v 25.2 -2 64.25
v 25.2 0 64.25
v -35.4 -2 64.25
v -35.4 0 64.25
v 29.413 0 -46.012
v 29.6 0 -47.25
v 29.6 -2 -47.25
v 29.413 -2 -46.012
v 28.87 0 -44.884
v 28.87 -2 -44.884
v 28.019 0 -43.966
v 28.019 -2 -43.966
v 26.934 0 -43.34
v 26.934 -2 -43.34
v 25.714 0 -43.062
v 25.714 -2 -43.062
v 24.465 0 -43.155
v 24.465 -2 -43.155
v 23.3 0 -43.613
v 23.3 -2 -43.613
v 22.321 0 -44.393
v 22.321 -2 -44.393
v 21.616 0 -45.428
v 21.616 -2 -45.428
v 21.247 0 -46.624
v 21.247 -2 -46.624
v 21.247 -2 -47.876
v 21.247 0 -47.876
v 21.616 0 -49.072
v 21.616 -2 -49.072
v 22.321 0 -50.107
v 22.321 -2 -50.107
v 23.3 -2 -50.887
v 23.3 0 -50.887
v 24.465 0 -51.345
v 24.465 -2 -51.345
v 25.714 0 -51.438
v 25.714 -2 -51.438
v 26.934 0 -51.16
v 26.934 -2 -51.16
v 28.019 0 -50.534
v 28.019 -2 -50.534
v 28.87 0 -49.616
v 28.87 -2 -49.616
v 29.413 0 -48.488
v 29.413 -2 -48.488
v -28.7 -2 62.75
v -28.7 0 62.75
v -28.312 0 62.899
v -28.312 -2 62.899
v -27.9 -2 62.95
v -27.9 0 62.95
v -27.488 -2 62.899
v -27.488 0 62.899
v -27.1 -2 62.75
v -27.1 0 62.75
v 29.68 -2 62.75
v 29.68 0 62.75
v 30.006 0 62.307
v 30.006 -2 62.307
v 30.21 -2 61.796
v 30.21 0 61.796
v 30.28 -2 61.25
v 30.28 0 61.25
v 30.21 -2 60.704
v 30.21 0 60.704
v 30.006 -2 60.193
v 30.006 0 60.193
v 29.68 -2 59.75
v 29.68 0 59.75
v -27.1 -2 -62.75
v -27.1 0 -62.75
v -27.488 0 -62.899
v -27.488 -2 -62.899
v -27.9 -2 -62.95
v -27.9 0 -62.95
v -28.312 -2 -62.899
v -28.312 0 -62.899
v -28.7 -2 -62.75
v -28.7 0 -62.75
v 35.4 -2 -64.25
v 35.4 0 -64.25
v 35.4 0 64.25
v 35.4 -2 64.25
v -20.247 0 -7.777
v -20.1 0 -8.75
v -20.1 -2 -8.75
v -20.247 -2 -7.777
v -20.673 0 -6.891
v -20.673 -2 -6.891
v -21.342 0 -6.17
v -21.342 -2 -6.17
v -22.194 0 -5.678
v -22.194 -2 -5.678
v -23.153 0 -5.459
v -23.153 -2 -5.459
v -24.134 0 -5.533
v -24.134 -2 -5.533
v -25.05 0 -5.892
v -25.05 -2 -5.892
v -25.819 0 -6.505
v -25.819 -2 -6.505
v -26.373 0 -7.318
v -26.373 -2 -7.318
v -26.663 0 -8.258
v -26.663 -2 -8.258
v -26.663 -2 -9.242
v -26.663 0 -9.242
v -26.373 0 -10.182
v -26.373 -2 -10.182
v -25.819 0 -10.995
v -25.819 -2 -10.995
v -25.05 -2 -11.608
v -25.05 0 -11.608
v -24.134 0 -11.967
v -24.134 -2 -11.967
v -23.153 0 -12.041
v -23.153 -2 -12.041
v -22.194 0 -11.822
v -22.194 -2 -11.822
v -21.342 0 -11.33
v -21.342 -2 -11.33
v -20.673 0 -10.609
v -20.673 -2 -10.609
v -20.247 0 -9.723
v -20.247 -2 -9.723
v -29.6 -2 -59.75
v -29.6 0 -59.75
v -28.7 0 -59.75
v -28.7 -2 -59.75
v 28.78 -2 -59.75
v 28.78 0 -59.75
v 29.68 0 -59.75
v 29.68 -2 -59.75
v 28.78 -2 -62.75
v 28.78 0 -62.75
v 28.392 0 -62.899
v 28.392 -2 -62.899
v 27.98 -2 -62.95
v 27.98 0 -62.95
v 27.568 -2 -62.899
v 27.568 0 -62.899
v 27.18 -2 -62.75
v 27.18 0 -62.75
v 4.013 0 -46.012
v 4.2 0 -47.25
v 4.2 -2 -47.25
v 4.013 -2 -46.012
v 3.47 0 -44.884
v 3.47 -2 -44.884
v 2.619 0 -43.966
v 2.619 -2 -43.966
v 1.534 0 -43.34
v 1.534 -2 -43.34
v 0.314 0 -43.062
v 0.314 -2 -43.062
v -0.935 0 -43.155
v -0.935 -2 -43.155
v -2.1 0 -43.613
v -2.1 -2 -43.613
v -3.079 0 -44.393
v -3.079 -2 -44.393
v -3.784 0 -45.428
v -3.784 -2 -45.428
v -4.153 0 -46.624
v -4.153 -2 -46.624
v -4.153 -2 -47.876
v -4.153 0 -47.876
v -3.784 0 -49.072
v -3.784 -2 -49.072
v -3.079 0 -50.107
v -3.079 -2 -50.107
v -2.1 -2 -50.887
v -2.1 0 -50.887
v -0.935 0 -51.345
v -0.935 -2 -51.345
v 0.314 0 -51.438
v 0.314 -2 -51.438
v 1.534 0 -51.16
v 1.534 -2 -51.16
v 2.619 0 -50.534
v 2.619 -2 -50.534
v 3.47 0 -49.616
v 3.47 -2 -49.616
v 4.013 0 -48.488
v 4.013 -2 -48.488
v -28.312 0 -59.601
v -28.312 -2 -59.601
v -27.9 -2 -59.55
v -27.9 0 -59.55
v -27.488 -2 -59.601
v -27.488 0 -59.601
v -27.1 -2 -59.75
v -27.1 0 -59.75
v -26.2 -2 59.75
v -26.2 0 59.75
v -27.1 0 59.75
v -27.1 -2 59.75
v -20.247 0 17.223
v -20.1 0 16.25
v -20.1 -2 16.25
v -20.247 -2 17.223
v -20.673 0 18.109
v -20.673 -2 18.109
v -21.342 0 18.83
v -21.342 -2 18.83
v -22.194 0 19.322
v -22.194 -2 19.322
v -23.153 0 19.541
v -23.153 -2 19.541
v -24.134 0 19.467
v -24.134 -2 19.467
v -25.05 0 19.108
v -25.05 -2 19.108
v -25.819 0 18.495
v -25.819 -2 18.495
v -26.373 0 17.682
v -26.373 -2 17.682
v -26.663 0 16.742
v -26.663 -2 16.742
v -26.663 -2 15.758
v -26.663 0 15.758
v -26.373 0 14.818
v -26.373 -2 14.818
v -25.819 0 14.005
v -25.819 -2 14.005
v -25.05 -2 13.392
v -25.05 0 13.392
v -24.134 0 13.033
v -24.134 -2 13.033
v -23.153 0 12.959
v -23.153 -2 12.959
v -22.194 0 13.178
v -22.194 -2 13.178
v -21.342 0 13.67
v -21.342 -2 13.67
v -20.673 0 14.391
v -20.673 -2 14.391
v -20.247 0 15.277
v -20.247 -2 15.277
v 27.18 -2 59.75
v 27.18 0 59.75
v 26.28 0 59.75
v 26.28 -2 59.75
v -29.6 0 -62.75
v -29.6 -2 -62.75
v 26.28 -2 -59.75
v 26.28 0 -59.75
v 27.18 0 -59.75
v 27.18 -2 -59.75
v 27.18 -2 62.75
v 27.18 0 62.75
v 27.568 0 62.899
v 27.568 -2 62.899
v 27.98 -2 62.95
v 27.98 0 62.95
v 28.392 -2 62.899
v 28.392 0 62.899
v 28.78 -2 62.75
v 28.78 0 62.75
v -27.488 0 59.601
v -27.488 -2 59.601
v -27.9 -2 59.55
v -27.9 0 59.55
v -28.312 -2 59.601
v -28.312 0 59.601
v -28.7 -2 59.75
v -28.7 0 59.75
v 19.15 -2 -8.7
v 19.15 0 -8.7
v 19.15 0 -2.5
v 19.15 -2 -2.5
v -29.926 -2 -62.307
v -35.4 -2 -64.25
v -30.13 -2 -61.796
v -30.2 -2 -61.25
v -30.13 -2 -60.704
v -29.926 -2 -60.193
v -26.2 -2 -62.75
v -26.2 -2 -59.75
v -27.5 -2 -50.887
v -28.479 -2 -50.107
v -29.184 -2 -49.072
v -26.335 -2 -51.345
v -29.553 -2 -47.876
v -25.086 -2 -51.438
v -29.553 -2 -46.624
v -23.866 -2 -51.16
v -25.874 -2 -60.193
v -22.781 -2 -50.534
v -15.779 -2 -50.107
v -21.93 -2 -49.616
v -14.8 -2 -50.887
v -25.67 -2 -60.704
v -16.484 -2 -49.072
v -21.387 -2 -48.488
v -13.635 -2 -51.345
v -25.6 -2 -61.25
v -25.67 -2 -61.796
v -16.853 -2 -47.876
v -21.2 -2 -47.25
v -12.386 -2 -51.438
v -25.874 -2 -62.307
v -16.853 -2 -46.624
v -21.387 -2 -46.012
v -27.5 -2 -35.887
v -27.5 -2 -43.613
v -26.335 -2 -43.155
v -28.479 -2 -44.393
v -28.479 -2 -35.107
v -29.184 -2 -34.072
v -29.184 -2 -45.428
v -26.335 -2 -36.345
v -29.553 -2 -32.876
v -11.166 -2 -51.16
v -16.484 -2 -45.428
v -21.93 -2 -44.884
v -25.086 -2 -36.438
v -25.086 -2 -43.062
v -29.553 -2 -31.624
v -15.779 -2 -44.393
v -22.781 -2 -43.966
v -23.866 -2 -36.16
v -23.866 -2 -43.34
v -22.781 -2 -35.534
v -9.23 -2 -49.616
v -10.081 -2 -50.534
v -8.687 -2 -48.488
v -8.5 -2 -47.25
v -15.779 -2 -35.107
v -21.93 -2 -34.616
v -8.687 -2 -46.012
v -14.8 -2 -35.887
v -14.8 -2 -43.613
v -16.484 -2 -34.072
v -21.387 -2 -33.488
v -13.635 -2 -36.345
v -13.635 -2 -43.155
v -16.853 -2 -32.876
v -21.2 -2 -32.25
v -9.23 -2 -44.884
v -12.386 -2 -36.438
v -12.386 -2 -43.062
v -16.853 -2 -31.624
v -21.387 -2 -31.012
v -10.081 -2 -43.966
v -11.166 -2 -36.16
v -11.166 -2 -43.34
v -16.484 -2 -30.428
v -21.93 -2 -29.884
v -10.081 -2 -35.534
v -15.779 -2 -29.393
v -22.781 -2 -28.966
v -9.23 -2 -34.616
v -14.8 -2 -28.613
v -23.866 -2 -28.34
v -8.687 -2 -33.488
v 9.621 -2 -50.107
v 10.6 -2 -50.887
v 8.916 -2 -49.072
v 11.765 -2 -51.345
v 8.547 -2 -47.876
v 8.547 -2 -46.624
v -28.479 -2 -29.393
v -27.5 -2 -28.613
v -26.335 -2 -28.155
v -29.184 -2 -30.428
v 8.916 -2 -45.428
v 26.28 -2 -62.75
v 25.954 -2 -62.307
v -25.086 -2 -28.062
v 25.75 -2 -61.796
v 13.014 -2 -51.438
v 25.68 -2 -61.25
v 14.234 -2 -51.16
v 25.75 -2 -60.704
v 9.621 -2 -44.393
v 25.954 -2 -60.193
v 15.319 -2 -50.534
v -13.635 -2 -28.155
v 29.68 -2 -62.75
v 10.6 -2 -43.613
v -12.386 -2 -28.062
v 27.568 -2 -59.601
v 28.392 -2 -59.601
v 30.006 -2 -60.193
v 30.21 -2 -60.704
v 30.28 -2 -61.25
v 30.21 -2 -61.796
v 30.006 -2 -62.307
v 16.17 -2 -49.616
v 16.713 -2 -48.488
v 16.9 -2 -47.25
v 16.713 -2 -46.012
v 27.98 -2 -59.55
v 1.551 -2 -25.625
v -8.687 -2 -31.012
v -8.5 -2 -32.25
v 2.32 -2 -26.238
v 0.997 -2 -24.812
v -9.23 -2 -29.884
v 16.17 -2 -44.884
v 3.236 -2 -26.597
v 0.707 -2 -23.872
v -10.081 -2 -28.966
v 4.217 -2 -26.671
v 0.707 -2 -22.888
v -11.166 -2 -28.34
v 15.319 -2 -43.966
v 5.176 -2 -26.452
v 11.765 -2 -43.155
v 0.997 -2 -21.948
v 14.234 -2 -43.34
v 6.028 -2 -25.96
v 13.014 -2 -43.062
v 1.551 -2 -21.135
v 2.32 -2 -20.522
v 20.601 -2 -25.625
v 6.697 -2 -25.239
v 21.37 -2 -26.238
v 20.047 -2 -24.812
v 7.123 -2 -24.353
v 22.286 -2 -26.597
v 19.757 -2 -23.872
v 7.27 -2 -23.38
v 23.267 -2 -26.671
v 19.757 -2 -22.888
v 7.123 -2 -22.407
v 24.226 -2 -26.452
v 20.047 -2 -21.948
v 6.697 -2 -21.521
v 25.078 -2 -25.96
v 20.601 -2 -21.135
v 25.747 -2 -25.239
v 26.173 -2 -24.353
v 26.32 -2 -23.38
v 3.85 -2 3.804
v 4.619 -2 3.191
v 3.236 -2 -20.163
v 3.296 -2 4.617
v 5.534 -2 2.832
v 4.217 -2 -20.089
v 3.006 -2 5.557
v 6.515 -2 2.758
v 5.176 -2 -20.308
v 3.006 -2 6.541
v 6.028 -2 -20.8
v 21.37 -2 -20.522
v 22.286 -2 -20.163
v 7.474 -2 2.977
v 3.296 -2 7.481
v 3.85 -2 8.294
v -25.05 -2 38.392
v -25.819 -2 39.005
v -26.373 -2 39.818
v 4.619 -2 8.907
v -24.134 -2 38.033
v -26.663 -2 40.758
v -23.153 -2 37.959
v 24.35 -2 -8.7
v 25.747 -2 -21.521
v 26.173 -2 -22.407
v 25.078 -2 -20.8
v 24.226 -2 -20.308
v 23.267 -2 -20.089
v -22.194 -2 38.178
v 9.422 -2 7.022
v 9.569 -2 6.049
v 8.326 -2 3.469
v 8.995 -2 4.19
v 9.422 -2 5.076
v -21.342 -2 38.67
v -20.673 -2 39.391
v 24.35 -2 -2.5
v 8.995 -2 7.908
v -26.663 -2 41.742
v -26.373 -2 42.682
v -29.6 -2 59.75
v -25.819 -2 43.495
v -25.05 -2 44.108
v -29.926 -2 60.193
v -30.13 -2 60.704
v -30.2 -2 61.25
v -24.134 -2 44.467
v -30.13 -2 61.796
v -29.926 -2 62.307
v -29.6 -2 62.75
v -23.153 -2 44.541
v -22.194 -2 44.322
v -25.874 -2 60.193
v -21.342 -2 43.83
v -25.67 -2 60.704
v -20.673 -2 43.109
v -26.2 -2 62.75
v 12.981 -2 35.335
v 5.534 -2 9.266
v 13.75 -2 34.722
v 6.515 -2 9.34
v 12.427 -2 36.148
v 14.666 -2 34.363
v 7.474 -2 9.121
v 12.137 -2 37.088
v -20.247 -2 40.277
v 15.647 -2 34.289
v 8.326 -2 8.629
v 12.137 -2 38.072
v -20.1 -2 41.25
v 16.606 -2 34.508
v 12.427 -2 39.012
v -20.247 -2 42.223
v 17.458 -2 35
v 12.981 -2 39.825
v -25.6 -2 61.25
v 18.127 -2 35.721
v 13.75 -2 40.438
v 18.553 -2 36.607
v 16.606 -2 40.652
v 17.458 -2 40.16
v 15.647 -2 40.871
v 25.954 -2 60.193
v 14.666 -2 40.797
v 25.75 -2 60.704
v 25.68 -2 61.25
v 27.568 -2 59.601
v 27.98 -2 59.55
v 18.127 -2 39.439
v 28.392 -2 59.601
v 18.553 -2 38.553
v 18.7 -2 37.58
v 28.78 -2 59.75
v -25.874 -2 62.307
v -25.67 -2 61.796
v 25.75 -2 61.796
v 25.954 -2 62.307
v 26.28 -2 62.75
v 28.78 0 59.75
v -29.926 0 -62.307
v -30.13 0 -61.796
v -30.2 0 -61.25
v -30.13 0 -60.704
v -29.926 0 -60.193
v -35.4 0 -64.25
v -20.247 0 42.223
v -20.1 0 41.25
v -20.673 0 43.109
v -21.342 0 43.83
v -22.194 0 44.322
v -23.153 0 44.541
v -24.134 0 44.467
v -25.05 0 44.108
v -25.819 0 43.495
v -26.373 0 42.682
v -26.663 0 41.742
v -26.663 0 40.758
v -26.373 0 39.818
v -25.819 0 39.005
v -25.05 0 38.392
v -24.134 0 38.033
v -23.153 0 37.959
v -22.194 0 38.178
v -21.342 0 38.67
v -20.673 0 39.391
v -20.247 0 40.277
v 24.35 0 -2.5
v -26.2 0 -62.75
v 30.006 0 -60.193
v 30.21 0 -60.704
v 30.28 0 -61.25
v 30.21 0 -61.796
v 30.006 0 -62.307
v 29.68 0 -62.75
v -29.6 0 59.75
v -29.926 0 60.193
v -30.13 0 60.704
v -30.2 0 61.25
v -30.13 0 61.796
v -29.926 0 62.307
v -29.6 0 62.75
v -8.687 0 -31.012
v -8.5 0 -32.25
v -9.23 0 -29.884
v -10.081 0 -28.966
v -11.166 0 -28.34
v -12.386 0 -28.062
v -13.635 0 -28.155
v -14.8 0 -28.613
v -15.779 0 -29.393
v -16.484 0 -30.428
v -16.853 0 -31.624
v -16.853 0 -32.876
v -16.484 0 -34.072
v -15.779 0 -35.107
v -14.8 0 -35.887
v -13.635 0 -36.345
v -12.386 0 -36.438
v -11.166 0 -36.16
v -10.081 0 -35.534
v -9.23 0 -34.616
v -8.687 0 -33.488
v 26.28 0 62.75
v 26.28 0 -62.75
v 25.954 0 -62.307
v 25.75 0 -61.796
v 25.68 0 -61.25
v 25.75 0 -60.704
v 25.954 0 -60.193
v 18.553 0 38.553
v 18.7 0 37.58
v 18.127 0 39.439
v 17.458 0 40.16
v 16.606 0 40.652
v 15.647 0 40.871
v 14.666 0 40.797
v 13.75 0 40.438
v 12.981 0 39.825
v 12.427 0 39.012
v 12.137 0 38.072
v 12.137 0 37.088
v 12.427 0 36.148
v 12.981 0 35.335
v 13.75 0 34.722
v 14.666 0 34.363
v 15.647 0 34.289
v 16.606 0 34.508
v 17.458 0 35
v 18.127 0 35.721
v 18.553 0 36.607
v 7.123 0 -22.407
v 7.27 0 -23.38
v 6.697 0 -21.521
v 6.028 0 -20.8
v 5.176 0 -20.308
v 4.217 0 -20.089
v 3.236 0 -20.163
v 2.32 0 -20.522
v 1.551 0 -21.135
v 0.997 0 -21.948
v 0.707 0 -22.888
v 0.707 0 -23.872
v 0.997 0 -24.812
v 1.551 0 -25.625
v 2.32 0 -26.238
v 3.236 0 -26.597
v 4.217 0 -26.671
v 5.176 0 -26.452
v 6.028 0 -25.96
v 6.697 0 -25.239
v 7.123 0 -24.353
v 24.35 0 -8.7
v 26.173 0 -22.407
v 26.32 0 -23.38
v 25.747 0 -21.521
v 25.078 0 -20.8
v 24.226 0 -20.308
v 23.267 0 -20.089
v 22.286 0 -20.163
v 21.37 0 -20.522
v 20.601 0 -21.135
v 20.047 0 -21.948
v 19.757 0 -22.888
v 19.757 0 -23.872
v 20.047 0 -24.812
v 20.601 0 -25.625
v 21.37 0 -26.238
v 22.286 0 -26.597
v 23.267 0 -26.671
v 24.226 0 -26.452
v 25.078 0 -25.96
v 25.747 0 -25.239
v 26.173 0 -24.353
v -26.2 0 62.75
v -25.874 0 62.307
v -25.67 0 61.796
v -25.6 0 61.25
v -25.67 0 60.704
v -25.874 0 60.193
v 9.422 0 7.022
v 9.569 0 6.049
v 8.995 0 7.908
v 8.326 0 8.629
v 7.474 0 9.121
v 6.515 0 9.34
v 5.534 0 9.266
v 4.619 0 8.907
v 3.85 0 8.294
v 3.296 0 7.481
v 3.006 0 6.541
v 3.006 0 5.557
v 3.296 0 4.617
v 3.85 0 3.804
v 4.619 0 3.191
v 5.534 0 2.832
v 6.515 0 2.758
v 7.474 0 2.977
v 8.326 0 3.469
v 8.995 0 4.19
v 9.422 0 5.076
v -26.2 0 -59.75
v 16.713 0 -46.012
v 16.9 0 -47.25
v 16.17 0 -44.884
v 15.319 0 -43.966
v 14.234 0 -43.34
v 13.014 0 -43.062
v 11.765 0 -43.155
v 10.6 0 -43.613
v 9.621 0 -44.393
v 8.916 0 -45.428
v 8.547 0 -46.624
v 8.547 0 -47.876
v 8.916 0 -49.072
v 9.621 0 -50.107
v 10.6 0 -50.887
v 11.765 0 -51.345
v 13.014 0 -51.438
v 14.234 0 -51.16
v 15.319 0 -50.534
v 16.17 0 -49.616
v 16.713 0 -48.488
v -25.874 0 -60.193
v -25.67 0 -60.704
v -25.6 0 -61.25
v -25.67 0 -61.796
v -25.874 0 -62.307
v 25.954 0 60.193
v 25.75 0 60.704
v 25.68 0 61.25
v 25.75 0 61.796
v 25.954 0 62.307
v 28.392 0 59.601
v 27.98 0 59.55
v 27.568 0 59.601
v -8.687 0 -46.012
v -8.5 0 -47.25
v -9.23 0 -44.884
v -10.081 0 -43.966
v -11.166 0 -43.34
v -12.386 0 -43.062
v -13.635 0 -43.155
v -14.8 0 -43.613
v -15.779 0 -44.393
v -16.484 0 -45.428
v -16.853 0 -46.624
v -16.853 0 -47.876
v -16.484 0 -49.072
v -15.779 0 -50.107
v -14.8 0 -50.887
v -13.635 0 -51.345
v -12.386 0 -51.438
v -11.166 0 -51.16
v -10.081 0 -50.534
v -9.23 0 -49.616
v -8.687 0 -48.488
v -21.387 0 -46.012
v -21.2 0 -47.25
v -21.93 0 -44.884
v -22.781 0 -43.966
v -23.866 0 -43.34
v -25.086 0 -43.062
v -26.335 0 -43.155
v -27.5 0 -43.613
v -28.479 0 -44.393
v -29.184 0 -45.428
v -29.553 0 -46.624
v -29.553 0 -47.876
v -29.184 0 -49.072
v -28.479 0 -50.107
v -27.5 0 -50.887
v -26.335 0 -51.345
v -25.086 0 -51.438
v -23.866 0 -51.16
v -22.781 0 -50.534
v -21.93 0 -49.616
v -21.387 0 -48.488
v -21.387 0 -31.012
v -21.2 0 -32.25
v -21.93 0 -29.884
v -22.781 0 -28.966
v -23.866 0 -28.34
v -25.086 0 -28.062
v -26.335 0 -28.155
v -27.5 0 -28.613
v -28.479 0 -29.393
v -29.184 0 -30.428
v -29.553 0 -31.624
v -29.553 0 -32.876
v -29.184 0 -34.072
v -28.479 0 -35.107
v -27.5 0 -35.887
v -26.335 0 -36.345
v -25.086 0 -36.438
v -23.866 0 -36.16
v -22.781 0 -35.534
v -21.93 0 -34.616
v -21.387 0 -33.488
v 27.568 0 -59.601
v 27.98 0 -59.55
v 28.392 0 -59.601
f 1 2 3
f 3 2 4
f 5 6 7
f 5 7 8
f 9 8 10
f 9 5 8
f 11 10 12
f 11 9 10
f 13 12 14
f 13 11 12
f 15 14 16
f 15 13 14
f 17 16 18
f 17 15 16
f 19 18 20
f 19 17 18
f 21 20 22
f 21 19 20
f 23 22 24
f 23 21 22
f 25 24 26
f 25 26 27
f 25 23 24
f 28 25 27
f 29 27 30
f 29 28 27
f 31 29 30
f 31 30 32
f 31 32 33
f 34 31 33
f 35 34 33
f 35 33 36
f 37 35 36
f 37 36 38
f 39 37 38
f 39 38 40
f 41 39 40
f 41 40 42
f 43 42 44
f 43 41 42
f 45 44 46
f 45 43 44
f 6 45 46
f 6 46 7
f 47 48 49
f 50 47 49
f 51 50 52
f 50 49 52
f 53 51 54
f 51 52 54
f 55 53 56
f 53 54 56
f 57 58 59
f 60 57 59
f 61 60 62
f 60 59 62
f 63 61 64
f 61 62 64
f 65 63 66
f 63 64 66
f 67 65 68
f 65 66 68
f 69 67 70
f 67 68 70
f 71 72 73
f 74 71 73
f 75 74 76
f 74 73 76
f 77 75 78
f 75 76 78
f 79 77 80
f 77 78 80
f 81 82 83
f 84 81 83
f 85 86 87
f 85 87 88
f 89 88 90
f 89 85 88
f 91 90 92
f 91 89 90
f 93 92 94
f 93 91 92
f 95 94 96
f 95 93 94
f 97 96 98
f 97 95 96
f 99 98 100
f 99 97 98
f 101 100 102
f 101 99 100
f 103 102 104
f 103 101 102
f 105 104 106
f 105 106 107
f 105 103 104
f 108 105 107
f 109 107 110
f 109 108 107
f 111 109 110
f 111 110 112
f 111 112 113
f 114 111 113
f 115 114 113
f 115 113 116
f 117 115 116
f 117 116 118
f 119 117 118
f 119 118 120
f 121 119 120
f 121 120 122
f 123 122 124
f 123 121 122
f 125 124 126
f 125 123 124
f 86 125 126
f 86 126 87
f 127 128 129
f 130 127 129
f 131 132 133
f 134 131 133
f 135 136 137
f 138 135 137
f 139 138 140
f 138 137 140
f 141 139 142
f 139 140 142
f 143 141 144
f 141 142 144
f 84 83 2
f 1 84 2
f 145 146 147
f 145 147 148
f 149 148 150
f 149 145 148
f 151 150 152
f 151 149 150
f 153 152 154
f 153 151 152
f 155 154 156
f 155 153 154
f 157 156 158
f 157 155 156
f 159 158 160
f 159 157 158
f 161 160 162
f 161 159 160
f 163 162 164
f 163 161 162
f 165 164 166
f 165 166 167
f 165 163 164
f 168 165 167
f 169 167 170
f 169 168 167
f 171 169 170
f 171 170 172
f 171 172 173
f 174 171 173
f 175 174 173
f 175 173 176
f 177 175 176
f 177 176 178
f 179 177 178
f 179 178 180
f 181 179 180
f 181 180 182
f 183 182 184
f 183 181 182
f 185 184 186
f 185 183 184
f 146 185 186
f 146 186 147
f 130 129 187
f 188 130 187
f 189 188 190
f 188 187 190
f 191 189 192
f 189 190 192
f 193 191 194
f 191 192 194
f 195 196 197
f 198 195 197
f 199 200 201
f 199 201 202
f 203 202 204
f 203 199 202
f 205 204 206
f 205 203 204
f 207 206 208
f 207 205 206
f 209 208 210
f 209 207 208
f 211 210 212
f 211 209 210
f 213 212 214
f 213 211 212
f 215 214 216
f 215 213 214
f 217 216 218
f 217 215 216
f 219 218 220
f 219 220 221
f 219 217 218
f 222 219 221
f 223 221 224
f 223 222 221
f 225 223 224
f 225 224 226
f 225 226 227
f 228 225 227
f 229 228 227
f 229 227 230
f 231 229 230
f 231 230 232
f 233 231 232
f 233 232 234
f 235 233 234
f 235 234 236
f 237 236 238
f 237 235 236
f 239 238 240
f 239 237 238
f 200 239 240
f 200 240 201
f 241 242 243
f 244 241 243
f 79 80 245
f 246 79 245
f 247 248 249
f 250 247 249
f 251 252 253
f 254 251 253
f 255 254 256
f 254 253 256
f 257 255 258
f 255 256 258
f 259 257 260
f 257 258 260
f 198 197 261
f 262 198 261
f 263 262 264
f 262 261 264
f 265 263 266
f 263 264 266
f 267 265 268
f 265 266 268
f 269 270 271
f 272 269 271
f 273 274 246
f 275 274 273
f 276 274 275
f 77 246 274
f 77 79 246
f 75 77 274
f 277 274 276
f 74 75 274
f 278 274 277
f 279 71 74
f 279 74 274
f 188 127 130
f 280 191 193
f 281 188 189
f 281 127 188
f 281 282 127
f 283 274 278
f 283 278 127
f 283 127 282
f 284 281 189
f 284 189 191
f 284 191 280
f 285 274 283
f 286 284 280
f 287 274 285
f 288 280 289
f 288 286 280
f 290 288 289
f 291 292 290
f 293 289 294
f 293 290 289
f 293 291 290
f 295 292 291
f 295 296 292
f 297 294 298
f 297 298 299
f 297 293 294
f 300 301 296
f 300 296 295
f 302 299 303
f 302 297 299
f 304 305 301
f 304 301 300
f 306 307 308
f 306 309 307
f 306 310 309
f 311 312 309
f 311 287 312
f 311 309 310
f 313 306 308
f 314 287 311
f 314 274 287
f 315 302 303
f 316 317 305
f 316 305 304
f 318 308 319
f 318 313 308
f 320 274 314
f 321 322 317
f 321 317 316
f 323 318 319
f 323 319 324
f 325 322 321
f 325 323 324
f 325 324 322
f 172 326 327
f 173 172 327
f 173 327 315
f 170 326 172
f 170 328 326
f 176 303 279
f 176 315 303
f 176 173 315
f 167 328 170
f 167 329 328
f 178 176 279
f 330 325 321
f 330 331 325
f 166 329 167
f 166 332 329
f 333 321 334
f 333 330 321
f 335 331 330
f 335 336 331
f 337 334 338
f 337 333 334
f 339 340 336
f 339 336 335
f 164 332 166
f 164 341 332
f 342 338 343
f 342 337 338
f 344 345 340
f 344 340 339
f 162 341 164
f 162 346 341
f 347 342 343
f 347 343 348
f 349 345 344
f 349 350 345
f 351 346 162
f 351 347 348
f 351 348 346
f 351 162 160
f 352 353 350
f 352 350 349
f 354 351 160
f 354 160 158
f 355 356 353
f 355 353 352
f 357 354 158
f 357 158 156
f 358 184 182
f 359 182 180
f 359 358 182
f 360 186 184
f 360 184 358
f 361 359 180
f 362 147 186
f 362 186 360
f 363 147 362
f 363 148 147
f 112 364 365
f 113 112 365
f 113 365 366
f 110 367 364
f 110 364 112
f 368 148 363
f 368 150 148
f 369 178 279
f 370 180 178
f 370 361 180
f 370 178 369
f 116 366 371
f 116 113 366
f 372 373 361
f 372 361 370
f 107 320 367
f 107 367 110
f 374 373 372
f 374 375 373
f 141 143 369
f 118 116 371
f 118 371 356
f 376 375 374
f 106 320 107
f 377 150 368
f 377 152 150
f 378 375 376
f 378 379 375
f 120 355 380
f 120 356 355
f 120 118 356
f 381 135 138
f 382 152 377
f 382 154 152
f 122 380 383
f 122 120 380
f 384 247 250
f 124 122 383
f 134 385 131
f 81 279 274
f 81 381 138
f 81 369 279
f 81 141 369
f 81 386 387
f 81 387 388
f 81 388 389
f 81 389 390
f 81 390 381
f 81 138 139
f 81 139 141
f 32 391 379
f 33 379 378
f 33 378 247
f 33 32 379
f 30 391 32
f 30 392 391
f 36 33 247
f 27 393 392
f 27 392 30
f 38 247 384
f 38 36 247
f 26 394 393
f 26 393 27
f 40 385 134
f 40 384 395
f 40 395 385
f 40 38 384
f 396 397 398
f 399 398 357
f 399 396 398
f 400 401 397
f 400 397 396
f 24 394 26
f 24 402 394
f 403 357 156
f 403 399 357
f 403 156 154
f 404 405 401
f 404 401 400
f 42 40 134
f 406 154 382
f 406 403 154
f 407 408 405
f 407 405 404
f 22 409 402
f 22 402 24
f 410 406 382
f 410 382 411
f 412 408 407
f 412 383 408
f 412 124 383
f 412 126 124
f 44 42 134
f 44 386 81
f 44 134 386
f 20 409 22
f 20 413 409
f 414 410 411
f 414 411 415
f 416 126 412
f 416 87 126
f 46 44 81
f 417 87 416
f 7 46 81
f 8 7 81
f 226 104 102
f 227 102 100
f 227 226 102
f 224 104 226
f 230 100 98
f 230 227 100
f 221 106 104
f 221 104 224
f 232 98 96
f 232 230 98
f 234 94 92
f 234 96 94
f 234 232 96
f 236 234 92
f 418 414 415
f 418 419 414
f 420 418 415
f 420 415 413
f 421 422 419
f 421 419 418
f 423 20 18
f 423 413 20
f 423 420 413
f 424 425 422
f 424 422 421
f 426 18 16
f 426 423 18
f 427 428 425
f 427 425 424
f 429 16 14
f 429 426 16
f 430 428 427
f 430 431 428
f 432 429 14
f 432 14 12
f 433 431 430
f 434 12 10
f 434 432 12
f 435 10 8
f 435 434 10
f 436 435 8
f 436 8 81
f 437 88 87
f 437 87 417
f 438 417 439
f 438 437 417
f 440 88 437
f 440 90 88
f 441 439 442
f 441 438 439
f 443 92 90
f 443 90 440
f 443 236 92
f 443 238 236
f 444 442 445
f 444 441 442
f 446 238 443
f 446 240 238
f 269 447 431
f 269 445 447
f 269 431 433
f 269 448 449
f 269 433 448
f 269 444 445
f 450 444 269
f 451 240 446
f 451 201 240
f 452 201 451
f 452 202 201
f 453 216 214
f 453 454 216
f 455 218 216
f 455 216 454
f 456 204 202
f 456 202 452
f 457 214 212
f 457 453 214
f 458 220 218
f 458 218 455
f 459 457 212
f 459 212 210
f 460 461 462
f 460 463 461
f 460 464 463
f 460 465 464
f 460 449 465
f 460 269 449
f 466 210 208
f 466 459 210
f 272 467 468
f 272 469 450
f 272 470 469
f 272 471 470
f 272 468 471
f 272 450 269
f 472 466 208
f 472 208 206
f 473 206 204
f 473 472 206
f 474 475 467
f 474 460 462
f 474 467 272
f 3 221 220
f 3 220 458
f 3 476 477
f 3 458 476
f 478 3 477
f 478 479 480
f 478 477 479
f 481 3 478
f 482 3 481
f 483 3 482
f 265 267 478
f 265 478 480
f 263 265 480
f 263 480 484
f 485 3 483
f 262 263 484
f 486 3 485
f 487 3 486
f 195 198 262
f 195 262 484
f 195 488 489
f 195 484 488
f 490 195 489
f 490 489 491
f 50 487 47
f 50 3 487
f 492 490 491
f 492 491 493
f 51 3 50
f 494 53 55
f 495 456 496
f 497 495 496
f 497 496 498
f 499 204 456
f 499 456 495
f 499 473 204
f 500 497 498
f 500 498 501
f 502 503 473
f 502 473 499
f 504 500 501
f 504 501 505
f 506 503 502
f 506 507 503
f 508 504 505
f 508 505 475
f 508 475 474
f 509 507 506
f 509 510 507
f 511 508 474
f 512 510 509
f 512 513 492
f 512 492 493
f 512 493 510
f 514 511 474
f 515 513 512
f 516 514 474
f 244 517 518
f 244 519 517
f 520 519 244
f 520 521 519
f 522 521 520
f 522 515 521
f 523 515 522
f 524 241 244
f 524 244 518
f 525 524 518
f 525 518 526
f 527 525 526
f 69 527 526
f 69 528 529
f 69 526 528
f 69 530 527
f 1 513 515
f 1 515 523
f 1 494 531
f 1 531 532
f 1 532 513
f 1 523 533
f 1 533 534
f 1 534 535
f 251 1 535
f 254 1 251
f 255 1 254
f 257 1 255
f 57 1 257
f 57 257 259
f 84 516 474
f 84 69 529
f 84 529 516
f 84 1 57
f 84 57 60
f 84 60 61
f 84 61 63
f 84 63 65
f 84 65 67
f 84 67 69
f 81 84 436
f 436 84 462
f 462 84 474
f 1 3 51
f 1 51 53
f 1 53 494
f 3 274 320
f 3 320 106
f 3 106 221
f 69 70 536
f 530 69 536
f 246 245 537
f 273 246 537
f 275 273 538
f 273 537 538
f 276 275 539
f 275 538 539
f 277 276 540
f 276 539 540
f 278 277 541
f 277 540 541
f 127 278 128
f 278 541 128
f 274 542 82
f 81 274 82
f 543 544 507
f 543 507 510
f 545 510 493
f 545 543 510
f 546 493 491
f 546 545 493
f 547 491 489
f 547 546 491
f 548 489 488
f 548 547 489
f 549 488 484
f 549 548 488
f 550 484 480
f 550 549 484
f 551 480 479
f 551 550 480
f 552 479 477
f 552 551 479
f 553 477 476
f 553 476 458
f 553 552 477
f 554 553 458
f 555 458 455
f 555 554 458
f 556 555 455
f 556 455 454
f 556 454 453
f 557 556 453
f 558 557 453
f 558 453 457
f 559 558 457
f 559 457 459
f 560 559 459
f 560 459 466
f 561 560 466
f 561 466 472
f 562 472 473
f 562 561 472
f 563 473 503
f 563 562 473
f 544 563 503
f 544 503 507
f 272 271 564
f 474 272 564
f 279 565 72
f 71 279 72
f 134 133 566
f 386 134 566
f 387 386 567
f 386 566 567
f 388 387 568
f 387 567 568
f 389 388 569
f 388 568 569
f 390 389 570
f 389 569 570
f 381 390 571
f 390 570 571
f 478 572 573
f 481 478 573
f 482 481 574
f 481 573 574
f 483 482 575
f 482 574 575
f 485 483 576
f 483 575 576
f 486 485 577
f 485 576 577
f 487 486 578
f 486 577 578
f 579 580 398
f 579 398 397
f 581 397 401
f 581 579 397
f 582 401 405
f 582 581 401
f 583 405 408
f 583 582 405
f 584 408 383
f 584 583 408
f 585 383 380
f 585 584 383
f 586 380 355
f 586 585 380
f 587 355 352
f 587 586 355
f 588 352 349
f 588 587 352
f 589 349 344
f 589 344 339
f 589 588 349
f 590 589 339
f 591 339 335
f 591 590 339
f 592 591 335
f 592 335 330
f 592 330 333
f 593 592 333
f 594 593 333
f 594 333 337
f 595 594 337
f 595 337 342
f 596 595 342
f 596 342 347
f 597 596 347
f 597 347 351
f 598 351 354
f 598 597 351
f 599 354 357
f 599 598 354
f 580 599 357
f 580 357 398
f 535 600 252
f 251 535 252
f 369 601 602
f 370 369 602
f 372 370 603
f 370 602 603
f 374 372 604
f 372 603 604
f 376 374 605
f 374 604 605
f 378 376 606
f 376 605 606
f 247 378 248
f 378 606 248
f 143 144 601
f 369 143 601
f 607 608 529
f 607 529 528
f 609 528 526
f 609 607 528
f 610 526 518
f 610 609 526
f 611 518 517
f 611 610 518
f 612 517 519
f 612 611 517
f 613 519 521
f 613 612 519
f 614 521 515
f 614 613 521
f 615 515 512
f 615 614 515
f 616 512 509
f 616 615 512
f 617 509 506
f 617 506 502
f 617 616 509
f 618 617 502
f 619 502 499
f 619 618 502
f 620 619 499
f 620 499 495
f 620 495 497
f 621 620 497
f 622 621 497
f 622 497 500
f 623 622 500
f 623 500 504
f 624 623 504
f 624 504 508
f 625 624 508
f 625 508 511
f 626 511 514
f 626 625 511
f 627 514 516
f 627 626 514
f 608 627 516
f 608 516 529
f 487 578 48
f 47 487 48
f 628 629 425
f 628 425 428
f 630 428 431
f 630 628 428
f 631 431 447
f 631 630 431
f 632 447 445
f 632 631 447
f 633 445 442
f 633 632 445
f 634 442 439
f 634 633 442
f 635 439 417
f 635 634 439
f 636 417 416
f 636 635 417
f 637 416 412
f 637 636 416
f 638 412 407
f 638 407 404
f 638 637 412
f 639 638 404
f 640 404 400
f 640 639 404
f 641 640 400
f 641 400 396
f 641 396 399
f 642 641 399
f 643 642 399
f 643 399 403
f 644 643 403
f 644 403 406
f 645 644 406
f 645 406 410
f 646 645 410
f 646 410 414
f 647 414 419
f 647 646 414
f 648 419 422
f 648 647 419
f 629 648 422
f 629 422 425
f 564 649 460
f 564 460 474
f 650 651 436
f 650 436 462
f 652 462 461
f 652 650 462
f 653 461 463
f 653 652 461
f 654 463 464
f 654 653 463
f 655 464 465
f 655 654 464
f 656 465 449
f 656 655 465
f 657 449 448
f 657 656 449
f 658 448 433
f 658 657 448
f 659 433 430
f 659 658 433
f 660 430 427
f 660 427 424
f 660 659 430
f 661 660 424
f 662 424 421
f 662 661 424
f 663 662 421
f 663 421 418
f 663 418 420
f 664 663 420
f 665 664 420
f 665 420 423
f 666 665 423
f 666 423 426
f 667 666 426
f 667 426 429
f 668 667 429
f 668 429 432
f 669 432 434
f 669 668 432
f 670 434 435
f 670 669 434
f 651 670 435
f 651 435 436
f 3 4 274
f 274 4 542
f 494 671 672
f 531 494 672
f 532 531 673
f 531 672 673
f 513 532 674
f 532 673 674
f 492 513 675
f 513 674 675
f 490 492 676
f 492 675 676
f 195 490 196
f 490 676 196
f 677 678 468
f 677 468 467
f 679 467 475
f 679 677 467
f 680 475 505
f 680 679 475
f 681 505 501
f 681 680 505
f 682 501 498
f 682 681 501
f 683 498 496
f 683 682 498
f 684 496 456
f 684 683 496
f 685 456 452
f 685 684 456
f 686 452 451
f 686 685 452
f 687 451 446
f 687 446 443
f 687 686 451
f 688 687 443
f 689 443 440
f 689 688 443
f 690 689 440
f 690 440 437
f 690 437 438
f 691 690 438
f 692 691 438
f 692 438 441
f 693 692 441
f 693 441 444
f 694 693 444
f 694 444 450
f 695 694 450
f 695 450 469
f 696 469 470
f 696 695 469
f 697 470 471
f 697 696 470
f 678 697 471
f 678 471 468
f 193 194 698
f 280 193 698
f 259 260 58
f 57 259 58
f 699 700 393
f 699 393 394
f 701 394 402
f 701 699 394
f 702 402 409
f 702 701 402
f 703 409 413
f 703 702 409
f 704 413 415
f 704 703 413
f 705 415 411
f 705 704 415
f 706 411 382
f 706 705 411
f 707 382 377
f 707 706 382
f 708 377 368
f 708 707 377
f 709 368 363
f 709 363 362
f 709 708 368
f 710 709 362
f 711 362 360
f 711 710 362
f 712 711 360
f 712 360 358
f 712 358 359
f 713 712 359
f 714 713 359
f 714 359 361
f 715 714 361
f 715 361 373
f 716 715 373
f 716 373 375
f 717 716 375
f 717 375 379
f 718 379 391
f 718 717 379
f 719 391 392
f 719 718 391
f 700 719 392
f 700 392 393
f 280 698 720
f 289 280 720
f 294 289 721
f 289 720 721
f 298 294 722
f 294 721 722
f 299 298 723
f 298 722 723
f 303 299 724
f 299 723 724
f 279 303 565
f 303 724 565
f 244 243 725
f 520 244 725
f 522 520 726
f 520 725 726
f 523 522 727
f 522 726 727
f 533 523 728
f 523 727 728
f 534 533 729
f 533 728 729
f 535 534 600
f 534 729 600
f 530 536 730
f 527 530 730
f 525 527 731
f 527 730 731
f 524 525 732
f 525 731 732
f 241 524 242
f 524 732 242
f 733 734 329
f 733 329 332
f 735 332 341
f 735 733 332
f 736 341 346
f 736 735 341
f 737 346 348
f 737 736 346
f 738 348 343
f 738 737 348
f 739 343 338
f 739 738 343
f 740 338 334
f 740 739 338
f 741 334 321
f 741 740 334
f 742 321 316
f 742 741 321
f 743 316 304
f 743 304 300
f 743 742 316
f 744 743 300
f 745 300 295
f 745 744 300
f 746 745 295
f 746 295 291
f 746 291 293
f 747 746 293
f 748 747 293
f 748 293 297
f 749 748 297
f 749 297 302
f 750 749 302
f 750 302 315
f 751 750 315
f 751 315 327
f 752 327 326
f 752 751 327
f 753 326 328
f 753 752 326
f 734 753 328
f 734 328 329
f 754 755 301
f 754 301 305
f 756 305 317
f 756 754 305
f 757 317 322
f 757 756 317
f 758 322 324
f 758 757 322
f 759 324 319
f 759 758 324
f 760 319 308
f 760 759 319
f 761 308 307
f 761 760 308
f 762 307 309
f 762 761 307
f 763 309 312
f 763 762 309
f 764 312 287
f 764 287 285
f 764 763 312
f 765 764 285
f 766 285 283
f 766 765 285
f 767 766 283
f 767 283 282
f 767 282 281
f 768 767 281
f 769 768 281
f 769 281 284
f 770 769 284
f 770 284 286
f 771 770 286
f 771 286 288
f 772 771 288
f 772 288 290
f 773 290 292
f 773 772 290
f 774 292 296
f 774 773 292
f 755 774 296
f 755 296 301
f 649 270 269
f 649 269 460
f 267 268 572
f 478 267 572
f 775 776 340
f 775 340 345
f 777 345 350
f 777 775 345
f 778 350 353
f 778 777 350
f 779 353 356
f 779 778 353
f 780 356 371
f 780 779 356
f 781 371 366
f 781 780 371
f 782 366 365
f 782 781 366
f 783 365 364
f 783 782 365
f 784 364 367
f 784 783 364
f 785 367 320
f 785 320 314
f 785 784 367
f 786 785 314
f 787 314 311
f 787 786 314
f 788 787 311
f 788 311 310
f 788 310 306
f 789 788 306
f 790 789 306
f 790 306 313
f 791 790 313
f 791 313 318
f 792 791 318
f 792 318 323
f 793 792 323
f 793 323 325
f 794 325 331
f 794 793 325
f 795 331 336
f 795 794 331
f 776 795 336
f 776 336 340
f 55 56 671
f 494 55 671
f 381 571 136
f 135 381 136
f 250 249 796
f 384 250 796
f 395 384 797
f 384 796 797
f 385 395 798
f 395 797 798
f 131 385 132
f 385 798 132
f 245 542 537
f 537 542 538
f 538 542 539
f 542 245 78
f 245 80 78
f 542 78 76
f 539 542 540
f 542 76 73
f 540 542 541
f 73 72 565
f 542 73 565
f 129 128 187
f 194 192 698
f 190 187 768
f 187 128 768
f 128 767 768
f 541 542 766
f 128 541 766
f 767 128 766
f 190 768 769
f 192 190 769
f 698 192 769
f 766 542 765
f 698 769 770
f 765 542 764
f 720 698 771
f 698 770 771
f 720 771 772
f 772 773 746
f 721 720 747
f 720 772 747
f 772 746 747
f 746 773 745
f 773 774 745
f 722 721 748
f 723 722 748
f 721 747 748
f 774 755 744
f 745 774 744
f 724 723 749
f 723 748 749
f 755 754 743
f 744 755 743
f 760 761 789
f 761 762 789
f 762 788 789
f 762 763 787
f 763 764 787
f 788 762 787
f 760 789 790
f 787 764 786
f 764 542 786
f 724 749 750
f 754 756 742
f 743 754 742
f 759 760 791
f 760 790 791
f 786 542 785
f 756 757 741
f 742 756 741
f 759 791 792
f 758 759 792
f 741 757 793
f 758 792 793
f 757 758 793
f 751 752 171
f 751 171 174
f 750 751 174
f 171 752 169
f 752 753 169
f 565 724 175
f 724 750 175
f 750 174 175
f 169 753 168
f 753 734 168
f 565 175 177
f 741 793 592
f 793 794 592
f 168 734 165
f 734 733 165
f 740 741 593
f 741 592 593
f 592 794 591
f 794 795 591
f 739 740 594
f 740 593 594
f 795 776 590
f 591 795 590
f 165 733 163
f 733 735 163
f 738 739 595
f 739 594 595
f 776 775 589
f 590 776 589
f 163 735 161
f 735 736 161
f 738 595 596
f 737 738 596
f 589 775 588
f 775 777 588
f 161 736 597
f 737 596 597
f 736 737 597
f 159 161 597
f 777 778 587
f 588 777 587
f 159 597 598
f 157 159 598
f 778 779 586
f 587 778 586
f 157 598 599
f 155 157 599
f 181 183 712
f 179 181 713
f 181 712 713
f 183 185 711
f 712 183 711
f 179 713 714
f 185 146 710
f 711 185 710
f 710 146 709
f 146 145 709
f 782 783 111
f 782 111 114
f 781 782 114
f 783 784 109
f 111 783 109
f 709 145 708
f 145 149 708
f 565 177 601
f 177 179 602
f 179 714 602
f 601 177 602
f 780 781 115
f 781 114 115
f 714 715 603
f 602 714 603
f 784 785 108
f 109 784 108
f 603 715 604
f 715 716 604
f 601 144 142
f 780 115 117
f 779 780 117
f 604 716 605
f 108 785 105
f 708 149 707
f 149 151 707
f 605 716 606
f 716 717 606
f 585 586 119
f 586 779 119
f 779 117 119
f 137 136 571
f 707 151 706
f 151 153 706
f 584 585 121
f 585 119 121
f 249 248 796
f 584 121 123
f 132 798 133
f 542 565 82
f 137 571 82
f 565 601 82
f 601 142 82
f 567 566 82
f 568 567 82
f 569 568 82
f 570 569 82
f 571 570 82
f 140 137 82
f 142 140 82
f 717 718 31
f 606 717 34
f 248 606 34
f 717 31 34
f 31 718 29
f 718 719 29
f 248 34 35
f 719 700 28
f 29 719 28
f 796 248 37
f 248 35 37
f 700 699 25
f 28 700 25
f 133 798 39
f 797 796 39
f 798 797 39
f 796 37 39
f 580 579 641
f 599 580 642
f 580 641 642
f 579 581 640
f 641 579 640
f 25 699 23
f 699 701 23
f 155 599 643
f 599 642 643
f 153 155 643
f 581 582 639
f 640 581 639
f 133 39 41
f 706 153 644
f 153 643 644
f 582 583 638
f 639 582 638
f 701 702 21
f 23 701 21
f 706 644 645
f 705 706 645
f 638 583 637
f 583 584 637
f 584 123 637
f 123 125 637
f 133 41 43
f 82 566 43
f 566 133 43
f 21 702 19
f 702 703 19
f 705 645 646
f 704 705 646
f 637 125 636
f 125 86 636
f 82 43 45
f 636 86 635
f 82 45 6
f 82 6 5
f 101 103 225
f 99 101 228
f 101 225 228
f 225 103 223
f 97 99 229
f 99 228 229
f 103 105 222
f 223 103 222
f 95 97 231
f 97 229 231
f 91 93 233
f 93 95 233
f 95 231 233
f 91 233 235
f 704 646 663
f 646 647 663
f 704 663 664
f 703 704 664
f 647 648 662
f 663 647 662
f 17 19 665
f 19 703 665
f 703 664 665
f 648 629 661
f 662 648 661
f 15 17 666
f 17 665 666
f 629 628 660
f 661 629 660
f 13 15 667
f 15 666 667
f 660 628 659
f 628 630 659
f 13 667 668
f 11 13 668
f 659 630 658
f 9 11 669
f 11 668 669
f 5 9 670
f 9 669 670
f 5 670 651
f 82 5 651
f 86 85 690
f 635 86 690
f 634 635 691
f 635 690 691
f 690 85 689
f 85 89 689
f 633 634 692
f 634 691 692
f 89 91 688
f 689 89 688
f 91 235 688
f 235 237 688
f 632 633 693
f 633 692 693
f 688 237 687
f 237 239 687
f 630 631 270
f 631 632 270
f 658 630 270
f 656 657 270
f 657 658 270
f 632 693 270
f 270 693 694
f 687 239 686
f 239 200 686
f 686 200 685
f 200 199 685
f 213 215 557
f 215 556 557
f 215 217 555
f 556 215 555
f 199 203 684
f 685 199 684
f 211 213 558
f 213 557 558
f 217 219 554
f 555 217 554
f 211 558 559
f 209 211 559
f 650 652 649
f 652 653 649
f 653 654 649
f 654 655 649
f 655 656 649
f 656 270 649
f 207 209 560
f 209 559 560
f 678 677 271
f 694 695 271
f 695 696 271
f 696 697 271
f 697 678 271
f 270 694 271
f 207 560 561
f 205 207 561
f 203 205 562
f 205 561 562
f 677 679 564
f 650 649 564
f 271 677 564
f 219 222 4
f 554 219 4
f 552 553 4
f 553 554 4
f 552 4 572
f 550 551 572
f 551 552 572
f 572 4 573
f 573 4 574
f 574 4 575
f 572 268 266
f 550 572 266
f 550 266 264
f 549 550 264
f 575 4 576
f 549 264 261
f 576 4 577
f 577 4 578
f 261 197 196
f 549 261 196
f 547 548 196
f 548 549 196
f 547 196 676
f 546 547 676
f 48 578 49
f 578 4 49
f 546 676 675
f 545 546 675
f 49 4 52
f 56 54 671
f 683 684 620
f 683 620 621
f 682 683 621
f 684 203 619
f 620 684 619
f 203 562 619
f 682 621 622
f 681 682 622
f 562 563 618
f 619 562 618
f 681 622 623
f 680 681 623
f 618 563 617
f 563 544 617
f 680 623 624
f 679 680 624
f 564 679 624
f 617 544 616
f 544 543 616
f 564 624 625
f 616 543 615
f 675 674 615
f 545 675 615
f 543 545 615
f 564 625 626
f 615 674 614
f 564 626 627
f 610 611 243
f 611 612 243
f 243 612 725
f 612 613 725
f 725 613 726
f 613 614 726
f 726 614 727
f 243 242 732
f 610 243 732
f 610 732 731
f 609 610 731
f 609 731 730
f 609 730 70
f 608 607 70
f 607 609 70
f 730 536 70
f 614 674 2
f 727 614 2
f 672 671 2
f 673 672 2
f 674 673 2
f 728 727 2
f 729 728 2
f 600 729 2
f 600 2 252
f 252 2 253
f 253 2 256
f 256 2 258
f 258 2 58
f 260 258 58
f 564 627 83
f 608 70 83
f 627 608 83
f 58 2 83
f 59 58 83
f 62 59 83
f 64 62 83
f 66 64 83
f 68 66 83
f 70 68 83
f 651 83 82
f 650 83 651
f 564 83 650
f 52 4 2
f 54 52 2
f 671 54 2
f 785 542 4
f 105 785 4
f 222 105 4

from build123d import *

# Parameters (mm, degrees)
F0_R     = 4.199999
F0_R_2   = 3.300001
F0_W     = 5.2
F0_H     = 6.199998
F1_DEPTH = 2


# Not quite as in the source:
# - ends of sketch curves that miss each other by under 0.0002 mm in the source are joined


with BuildPart() as f1:
    # F0 (on Front) → F1 (new body)
    with BuildSketch(Plane.XZ):
        Polygon((-35.399994, -61.250012), (-35.399994, -64.250012), (35.399993, -64.250012), (35.399993, 64.250001), (25.199994, 64.250011), (15.100006, 64.250011), (-35.399994, 64.250011), align=None)
        with BuildLine():
            Line((-28.699995, -62.750012), (-29.599993, -62.750012))
            ThreePointArc((-29.599993, -62.750012), (-30.199994, -61.2500123621), (-29.5999938002, -59.7500141903))
            Line((-29.5999938002, -59.7500141903), (-28.699995, -59.750013))
            ThreePointArc((-28.699995, -59.750013), (-27.8999944412, -59.550011), (-27.099993, -59.750013))
            Line((-27.099993, -59.750013), (-26.199995, -59.750013))
            ThreePointArc((-26.199995, -59.750013), (-25.599994, -61.2500123621), (-26.1999951748, -62.7500108335))
            Line((-26.1999951748, -62.7500108335), (-27.099993, -62.750012))
            ThreePointArc((-27.099993, -62.750012), (-27.8999944412, -62.950014), (-28.699995, -62.750012))
        make_face(mode=Mode.SUBTRACT)
        with Locations((-25.400037, -47.249964)):
            Circle(F0_R, mode=Mode.SUBTRACT)
        with Locations((-25.400037, -32.249966)):
            Circle(F0_R, mode=Mode.SUBTRACT)
        with Locations((-12.700012, -47.249939)):
            Circle(F0_R, mode=Mode.SUBTRACT)
        with Locations((-12.700063, -32.249938)):
            Circle(F0_R, mode=Mode.SUBTRACT)
        with Locations((-3.7e-05, -47.249964)):
            Circle(F0_R, mode=Mode.SUBTRACT)
        with Locations((-23.400008, -8.750001)):
            Circle(F0_R_2, mode=Mode.SUBTRACT)
        with Locations((12.699963, -47.249964)):
            Circle(F0_R, mode=Mode.SUBTRACT)
        with BuildLine():
            ThreePointArc((27.179992, -59.75), (27.9799934412, -59.549998), (28.7799947785, -59.7500004152))
            Line((28.7799947785, -59.7500004152), (29.679992, -59.75))
            ThreePointArc((29.679992, -59.75), (30.279993, -61.25), (29.6799923008, -62.7499983341))
            Line((29.6799923008, -62.7499983341), (28.779994, -62.749999))
            ThreePointArc((28.779994, -62.749999), (27.9799934412, -62.950001), (27.179992, -62.749999))
            Line((27.179992, -62.749999), (26.279994, -62.749999))
            ThreePointArc((26.279994, -62.749999), (25.679993, -61.25), (26.2799941748, -59.7500011665))
            Line((26.2799941748, -59.7500011665), (27.179992, -59.75))
        make_face(mode=Mode.SUBTRACT)
        with Locations((25.400013, -47.249921)):
            Circle(F0_R, mode=Mode.SUBTRACT)
        with Locations((3.969993, -23.379999)):
            Circle(F0_R_2, mode=Mode.SUBTRACT)
        with Locations((23.019993, -23.379999)):
            Circle(F0_R_2, mode=Mode.SUBTRACT)
        with Locations((21.74983, -5.600162)):
            Rectangle(F0_W, F0_H, mode=Mode.SUBTRACT)
        with Locations((-23.400008, 16.25)):
            Circle(F0_R_2, mode=Mode.SUBTRACT)
        with Locations((-23.400008, 41.250001)):
            Circle(F0_R_2, mode=Mode.SUBTRACT)
        with BuildLine():
            Line((-28.700008, 59.750002), (-29.600006, 59.750002))
            ThreePointArc((-29.600006, 59.750002), (-30.200007, 61.250002), (-29.6000038751, 62.7500028811))
            Line((-29.6000038751, 62.7500028811), (-28.700008, 62.750001))
            ThreePointArc((-28.700008, 62.750001), (-27.9000065588, 62.950003), (-27.1000052215, 62.7500005848))
            Line((-27.1000052215, 62.7500005848), (-26.200008, 62.750001))
            ThreePointArc((-26.200008, 62.750001), (-25.600007, 61.250002), (-26.2000076992, 59.7500036659))
            Line((-26.2000076992, 59.7500036659), (-27.100006, 59.750002))
            ThreePointArc((-27.100006, 59.750002), (-27.9000065588, 59.55), (-28.700008, 59.750002))
        make_face(mode=Mode.SUBTRACT)
        with Locations((6.268744, 6.048941)):
            Circle(F0_R_2, mode=Mode.SUBTRACT)
        with Locations((15.399993, 37.580001)):
            Circle(F0_R_2, mode=Mode.SUBTRACT)
        with BuildLine():
            Line((27.179992, 59.750025), (26.279994, 59.750025))
            ThreePointArc((26.279994, 59.750025), (25.679993, 61.2500246379), (26.2799936754, 62.7500233092))
            Line((26.2799936754, 62.7500233092), (27.179992, 62.750024))
            ThreePointArc((27.179992, 62.750024), (27.9799934412, 62.950026), (28.7799947785, 62.7500235848))
            Line((28.7799947785, 62.7500235848), (29.679992, 62.750024))
            ThreePointArc((29.679992, 62.750024), (30.279993, 61.2500246379), (29.6799923008, 59.7500266659))
            Line((29.6799923008, 59.7500266659), (28.779994, 59.750025))
            ThreePointArc((28.779994, 59.750025), (27.9799934412, 59.550023), (27.179992, 59.750025))
        make_face(mode=Mode.SUBTRACT)
    extrude(amount=F1_DEPTH)


solid = f1.part
